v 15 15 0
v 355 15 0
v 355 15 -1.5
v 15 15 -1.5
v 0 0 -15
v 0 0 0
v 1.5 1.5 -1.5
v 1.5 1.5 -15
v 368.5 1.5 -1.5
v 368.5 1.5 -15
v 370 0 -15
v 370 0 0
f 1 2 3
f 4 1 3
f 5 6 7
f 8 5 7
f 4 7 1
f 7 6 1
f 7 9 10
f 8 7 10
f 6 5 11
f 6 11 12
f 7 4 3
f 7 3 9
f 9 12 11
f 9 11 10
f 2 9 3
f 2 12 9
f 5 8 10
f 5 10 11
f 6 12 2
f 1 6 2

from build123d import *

# Parameters (mm, degrees)
EXTRUDE_1_DEPTH     = 370
CUT_EXTRUDE_1_DEPTH = 16


with BuildPart() as part:
    # Эскиз1 → Бобышка-Вытянуть1 (new body)
    with BuildSketch(Plane(origin=(0, 0, 0), x_dir=(0, 0, -1), z_dir=(1, 0, 0))):
        Polygon((0, 0), (0, 15), (1.5, 15), (1.5, 1.5), (15, 1.5), (15, 0), align=None)
    extrude(amount=EXTRUDE_1_DEPTH)

    # Эскиз2 → Вырез-Вытянуть1 (cut, through all)
    with BuildSketch(Plane.XY):
        Polygon((0, 0), (22.757405311, 22.757405311), (0, 22.757405311), align=None)
    cut_extrude_1 = extrude(amount=-CUT_EXTRUDE_1_DEPTH, mode=Mode.SUBTRACT)

    # Зеркальное отражение1: Вырез-Вытянуть1 across plane
    add(cut_extrude_1.mirror(Plane.ZY.offset(-185)), mode=Mode.SUBTRACT)


solid = part.part
